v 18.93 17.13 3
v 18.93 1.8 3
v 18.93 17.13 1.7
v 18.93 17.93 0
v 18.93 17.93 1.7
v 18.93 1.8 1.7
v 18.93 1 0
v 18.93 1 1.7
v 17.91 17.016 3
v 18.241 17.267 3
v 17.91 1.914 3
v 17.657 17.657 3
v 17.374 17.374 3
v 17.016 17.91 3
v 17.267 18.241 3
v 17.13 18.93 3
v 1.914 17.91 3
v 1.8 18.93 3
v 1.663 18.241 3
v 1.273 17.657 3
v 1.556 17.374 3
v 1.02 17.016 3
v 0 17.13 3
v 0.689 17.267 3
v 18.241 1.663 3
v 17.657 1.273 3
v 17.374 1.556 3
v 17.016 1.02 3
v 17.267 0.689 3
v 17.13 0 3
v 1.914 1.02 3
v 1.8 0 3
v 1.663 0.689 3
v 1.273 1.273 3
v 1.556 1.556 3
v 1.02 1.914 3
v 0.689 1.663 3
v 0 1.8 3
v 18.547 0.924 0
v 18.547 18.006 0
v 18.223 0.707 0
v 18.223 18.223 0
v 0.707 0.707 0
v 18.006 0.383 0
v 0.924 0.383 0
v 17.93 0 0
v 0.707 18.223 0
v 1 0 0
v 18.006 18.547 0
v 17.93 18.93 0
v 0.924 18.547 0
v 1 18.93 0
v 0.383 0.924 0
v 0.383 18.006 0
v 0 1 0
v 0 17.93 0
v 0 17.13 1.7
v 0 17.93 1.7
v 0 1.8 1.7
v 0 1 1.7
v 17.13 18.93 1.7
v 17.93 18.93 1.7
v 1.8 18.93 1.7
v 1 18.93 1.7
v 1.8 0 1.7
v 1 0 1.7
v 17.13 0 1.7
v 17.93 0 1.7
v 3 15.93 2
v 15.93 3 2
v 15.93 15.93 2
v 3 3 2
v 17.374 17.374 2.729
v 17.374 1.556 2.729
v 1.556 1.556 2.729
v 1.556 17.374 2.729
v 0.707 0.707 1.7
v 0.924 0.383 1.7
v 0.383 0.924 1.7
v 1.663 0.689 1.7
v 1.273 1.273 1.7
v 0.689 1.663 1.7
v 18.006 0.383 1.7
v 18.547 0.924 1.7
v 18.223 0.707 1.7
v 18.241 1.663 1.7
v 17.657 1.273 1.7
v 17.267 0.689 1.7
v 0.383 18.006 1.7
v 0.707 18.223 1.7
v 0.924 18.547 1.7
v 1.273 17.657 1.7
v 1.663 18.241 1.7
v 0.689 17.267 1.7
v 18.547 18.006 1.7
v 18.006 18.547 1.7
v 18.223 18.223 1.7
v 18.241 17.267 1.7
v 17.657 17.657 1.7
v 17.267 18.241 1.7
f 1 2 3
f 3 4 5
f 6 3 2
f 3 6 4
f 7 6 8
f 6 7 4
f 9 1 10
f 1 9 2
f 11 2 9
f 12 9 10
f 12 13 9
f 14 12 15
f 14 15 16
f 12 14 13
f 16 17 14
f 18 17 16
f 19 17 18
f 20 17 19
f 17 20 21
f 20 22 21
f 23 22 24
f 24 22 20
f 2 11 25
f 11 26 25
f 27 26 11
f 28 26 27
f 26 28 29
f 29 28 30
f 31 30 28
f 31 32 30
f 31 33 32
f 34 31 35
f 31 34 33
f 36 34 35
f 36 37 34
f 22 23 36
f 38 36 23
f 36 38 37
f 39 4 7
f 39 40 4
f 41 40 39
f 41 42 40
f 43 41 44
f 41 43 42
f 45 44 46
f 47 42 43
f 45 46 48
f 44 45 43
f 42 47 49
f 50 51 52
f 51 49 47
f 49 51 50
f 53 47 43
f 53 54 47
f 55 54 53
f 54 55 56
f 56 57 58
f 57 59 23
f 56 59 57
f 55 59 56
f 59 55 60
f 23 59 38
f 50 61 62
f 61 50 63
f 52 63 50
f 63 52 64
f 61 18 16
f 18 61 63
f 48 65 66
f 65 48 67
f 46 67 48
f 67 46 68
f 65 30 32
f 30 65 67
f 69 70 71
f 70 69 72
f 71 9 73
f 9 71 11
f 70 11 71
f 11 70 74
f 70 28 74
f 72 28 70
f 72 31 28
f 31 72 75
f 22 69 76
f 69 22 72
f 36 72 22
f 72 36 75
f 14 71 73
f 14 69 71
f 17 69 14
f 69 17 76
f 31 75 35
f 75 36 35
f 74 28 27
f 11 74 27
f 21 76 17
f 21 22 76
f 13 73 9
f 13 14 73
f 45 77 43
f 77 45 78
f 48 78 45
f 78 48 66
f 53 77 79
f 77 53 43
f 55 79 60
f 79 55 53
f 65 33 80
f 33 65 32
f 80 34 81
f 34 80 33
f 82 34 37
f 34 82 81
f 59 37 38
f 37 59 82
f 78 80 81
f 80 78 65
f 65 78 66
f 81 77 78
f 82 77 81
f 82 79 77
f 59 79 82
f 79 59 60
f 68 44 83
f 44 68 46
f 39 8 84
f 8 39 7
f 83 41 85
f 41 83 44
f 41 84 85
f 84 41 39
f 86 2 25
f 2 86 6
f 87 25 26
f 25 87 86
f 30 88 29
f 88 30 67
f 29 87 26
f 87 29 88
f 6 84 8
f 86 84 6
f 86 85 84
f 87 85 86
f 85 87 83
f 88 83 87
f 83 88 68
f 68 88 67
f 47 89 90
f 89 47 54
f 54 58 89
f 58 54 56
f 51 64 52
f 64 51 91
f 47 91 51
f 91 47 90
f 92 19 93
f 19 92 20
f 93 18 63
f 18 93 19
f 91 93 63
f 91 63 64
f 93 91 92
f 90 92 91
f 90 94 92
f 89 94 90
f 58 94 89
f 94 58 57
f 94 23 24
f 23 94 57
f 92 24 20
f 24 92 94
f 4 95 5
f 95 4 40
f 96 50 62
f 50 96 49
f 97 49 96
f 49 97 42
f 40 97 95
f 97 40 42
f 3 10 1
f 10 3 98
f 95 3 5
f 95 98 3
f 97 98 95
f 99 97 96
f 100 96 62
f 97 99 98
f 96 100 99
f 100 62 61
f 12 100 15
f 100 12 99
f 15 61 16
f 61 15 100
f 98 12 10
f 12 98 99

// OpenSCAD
//OpenSCAD-Skript

//Moduldefinition mit Parametern für Frontplattensystem im 19mm-Raster
module FrontElem (
//Parameter
x=1,            //Anzahl der Segmente in horizontaler Richtung
y=1,            //Anzahl der Segmente in vertikaler Richtung
segment=18.93,  //Kantenlänge des Segments
plate=2.0,      //verbleibende Dicke des Frontplattensegments
wo=1.0,         //Wandstärke oben
wu=3.0,         //Wandstärke unten
thck=3.0,       //Höhe des Rands des Frontplattensegments
M3=false,       //Bohrungen für M3-Zylinderkopf-Inbusschraube
skd3=5.6,       //Schraubenkopfdurchmesser M3-Schraube
skh3=3.3,       //Schraubenkopfhöhe M3-Schraube
dsh3=3.1,       //Schaftdurchmesser M3-Schraube
dvst3=7,        //Verstärkung für M3-Schraube
B2mm=true,      //Bohrungen für 2mm-Schneidschrauben
skd2=3.6,       //Schraubenkopfdurchmesser 2mm-Schraube (4.4)
skh2=1.3,       //Schraubenkopfhöhe 2mm-Schraube
dsh2=2.0,       //Schaftdurchmesser 2mm-Schraube
dvst2=4.4,      //Verstärkung für 2mm-Schraube
Btext=6.0,      //Breite Beschriftungsband
Ltext=12,       //Länge Beschriftungsband
Dtext=0.3,      //Tiefe Beschriftungsfeld, oder Null
LEDdia=5.0,     //Durchmesser LED
LEDr=5.0,       //Kantenlänge quadratische LED
LEDB=5.0,       //Breite der Rechteck-LED
LEDH=3.0,       //Höhe der Rechteck-LED
KSWdia=6.0,     //Schaftdurchmesser Kippschalter
RSWdia=9.2,     //Schaftdurchmesser Drehschalter
RSWdist=9.4,    //Mittenabstand Pin
RSWpin=3.0,     //Durchmesser Pin
POTdia=6.8,     //Schaftdurchmesser Poti
TRMdia=4.0,     //Bohrung für Polklemme M4
TRSdia=6.0,     //Bohrung für Telefonbuchse 4mm
MCdia=11.8,     //Bohrung für MC-Buchse 4mm
MCdist=10.4,    //Abstand Abflachungen
BNCdia=9.5,     //Durchmesser Bohrung
BNCdist=8.0,    //Abstand Abflachung
PM3B=22.5,      //Breite Panelmeter 3-stellig
PM3H=14.5,      //Höhe Panelmeter 3-stellig
PM4B=30.0,      //Breite Panelmeter 4-stellig
PM4H=14.2      //Höhe Panelmeter 4-stellig

)
//Beginn Modul
{
difference(){   //difference 1
union(){        //union 1
difference(){   //difference 2
union(){        //union 2
    //alles, was vor der nächsten geschweiften Klammer steht, wird zusammengefügt (union 2)
//Körper des Frontplattensegments
cube([x*segment, y*segment, thck]);


}               //union 2 end
    //alles, was vor der nächsten geschweiften Klammer steht, wird davon abgezogen (difference 2)
//Einsenkung in das Segment
polyhedron(
               points= [[wu,wu,plate],                                  //0 unten
                        [x*segment-wu,wu,plate],                    //1 unten
                        [x*segment-wu,y*segment-wu,plate],      //2 unten
                        [wu,y*segment-wu,plate],                    //3 unten
                        [wo,wo,thck+0.01],                              //4 oben
                        [wo,y*segment-wo, thck+0.01],               //5 oben
                        [x*segment-wo,y*segment-wo,thck+0.01],  //6 oben
                        [x*segment-wo,wo,thck+0.01],                //7 oben
                       ],
               faces=  [[0,1,2,3],      //Boden
                        [0,4,7,1],      //Deckel
                        [1,7,6,2],      //Front
                        [2,6,5,3],      //Seitenwand rechts
                        [3,5,4,0],      //Rückwand
                        [4,5,6,7]]      //Seitenwand links
               );   
/*
//Bohrung für LED mittig (Mindestgröße 1x1)
translate([x*segment/2,y*segment/2-3,-0.1])  cylinder(d=LEDdia, h=10, $fn=32);
*/

/*
//Bohrung für LED nach unten versetzt mit Textfeld darüber (Mindestgröße 1x1, bei 10mm LED 1x2)
translate([x*segment/2,y*segment/2-3,-0.1])  cylinder(d=LEDdia, h=10, $fn=32);
translate([x*segment/2-Ltext/2,y*segment/2,plate-Dtext+0.05])  cube([Ltext, Btext, Dtext]); 
*/

/*
//Bohrung für Kippschalter mittig (Mindestgröße 1x1)
translate([x*segment/2,y*segment/2,-0.1])  cylinder(d=KSWdia, h=10, $fn=32); 
*/

/*
//Bohrungen für Drehschalter mit Pin (Mindestgröße 2x2)
translate([x*segment/2,y*segment/2,-0.1])  cylinder(d=RSWdia, h=10, $fn=32);
translate([x*segment/2+RSWdist,y*segment/2,-0.1])  cylinder(d=RSWpin, h=1.5, $fn=32);
*/

/*
//Bohrung für Potentiometer 3mm-Schaft (Mindestgröße 1x1)
translate([x*segment/2,y*segment/2,-0.1])  cylinder(d=POTdia, h=10, $fn=32);
*/

/*
//Bohrung für 4mm-Polklemme M4 (Mindestgröße 1x1)
translate([x*segment/2,y*segment/2,-0.1])  cylinder(d=TRMdia, h=10, $fn=32);
*/       

/*
//Bohrung für 4mm-Telefonbuchse (Mindestgröße 1x1)
translate([x*segment/2,y*segment/2,-0.1])  cylinder(d=TRSdia, h=10, $fn=32);
*/

/*
//Bohrung für 4mm-MC-Buchse (Mindestgröße 2x2), siehe auch union1 für Abflachungen
translate([x*segment/2,y*segment/2,-0.1])  cylinder(d=MCdia, h=10, $fn=32);
*/

/*
//Bohrung für BNC-Buchse (Mindestgröße 1x1), siehe auch union1 für Abflachungen
translate([x*segment/2,y*segment/2,-0.1])  cylinder(d=BNCdia, h=10, $fn=32);
*/

/*
//Ausschnitt Panelmeter 3-stellig (Mindestgröße 2x1)
translate([x*segment/2-PM3B/2,y*segment/2-PM3H/2,-0.1])  cube([PM3B, PM3H, 10]);
*/

/*
//Ausschnitt Panelmeter 4-stellig (Mindestgröße 2x1)
translate([x*segment/2-PM4B/2,y*segment/2-PM4H/2,-0.1])  cube([PM4B, PM4H, 10]);
*/       
        
}  //difference 2 end
    //alles, was vor der nächsten geschweiften Klammer steht, wird dazu hinzugefügt (union 1)
//Verstärkungen für Schrauben x-Achse unten
for (x=[0:segment:x*segment])
{
if (M3==true) translate([x,0,0]) cylinder(d=dvst3,h=thck,$fn=16);
if (B2mm==true) translate([x,0,0]) cylinder(d=dvst2,h=thck,$fn=16);
}
//Verstärkungen für Schrauben x-Achse oben
for (x=[0:segment:x*segment])
{
if (M3==true) translate([x,y*segment,0]) cylinder(d=dvst3,h=thck,$fn=16);
if (B2mm==true) translate([x,y*segment,0]) cylinder(d=dvst2,h=thck,$fn=16);
}
//Verstärkungen für Schrauben y-Achse links
for (y=[0:segment:y*segment])
{
if (M3==true) translate([0,y,0]) cylinder(d=dvst3,h=thck,$fn=16);
if (B2mm==true) translate([0,y,0]) cylinder(d=dvst2,h=thck,$fn=16);
}
//Verstärkungen für Schrauben y-Achse rechts
for (y=[0:segment:y*segment])
{
if (M3==true) translate([x*segment,y,0]) cylinder(d=dvst3,h=thck,$fn=16);
if (B2mm==true) translate([x*segment,y,0]) cylinder(d=dvst2,h=thck,$fn=16);
}

/*
//Abflachungen für 4mm-MC-Buchse (Mindestgröße 2x2)
translate([x*segment/2-5,y*segment/2+MCdist/2,0])  cube([10,3,plate]);
translate([x*segment/2-5,y*segment/2-MCdist/2-3,0])  cube([10,3,plate]);
*/

/*
//Abflachungen für BNC-Buchse (Mindestgröße 1x1)
translate([x*segment/2-5,y*segment/2+BNCdist/2,0])  cube([10,3,plate]);
translate([x*segment/2-5,y*segment/2-BNCdist/2-3,0])  cube([10,3,plate]);
*/

}               //union 1 end
    //alles, was vor der nächsten geschweiften Klammer steht, wird davon wieder abgezogen (difference 1)
//Bohrungen für Schrauben x-Achse unten
for (x=[0:segment:x*segment])
{
if (M3==true) translate([x,0,-0.1]) cylinder(d=dsh3,h=2*thck,$fn=16);
if (M3==true) translate([x,0,thck-skh3]) cylinder(d=skd3,h=2*thck,$fn=16);
if (B2mm==true) translate([x,0,-0.1]) cylinder(d=dsh2,h=2*thck,$fn=16);
if (B2mm==true) translate([x,0,thck-skh2]) cylinder(d=skd2,h=2*thck,$fn=16); 
}
//Bohrungen für Schrauben x-Achse oben
for (x=[0:segment:x*segment])
{
if (M3==true) translate([x,y*segment,-0.1]) cylinder(d=dsh3,h=2*thck,$fn=16);
if (M3==true) translate([x,y*segment,thck-skh3]) cylinder(d=skd3,h=2*thck,$fn=16);
if (B2mm==true) translate([x,y*segment,-0.1]) cylinder(d=dsh2,h=2*thck,$fn=16);
if (B2mm==true) translate([x,y*segment,thck-skh2]) cylinder(d=skd2,h=2*thck,$fn=16); 
}
//Bohrungen für Schrauben y-Achse links
for (y=[0:segment:y*segment])
{
if (M3==true) translate([0,y,-0.1]) cylinder(d=dsh3,h=2*thck,$fn=16);
if (M3==true) translate([0,y,thck-skh3]) cylinder(d=skd3,h=2*thck,$fn=16);
if (B2mm==true) translate([0,y,-0.1]) cylinder(d=dsh2,h=2*thck,$fn=16);
if (B2mm==true) translate([0,y,thck-skh2]) cylinder(d=skd2,h=2*thck,$fn=16); 
}
//Bohrungen für Schrauben y-Achse rechts
for (y=[0:segment:y*segment])
{
if (M3==true) translate([x*segment,y,-0.1]) cylinder(d=dsh3,h=2*thck,$fn=16);
if (M3==true) translate([x*segment,y,thck-skh3]) cylinder(d=skd3,h=2*thck,$fn=16);
if (B2mm==true) translate([x*segment,y,-0.1]) cylinder(d=dsh2,h=2*thck,$fn=16);
if (B2mm==true) translate([x*segment,y,thck-skh2]) cylinder(d=skd2,h=2*thck,$fn=16); 
}
//Abschneiden Verstärkungen unten
translate([-250,-10,-0.1])
cube([500,10,25]);
//Abschneiden Verstärkungen oben
translate([-250,y*segment,-0.1])
cube([500,10,25]);
//Abschneiden Verstärkungen links
translate([-10,-250,-0.1])
cube([10,500,25]);
//Abschneiden Verstärkungen rechts
translate([x*segment,-250,-0.1])
cube([10,500,25]);
}               //difference 1 end

}  //module end

//Hier werden Instanzen des Moduls aufgerufen
translate([0,0,0]) FrontElem();
